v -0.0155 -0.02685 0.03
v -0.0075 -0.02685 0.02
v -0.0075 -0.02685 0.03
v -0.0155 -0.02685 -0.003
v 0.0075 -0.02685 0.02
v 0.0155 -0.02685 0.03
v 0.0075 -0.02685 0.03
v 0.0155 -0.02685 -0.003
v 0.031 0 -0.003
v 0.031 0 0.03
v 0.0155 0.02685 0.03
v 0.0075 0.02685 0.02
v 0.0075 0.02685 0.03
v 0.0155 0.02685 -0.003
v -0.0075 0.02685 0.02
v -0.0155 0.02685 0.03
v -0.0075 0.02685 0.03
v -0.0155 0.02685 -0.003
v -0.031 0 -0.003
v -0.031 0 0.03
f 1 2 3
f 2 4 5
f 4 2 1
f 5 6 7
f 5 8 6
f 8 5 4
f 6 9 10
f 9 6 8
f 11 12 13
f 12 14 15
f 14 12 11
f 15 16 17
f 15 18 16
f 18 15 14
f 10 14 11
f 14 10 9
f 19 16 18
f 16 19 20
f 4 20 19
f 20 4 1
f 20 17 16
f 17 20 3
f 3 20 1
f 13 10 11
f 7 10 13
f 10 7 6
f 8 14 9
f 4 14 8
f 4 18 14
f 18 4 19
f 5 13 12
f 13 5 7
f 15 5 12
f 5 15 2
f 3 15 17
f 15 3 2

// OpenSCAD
screw_radius = 0.031;
screw_height = 0.030;

notch_width = 0.015;
notch_depth = 0.010;

module ConfigScrew() {
  difference() {
    translate([0,0,screw_height*0.45])
      cylinder(h=screw_height*1.1, r=screw_radius, center=true, $fn=6);
    translate([0,0,screw_height])
      cube([notch_width, screw_radius*3, notch_depth*2], center=true);
  }
}

ConfigScrew();
